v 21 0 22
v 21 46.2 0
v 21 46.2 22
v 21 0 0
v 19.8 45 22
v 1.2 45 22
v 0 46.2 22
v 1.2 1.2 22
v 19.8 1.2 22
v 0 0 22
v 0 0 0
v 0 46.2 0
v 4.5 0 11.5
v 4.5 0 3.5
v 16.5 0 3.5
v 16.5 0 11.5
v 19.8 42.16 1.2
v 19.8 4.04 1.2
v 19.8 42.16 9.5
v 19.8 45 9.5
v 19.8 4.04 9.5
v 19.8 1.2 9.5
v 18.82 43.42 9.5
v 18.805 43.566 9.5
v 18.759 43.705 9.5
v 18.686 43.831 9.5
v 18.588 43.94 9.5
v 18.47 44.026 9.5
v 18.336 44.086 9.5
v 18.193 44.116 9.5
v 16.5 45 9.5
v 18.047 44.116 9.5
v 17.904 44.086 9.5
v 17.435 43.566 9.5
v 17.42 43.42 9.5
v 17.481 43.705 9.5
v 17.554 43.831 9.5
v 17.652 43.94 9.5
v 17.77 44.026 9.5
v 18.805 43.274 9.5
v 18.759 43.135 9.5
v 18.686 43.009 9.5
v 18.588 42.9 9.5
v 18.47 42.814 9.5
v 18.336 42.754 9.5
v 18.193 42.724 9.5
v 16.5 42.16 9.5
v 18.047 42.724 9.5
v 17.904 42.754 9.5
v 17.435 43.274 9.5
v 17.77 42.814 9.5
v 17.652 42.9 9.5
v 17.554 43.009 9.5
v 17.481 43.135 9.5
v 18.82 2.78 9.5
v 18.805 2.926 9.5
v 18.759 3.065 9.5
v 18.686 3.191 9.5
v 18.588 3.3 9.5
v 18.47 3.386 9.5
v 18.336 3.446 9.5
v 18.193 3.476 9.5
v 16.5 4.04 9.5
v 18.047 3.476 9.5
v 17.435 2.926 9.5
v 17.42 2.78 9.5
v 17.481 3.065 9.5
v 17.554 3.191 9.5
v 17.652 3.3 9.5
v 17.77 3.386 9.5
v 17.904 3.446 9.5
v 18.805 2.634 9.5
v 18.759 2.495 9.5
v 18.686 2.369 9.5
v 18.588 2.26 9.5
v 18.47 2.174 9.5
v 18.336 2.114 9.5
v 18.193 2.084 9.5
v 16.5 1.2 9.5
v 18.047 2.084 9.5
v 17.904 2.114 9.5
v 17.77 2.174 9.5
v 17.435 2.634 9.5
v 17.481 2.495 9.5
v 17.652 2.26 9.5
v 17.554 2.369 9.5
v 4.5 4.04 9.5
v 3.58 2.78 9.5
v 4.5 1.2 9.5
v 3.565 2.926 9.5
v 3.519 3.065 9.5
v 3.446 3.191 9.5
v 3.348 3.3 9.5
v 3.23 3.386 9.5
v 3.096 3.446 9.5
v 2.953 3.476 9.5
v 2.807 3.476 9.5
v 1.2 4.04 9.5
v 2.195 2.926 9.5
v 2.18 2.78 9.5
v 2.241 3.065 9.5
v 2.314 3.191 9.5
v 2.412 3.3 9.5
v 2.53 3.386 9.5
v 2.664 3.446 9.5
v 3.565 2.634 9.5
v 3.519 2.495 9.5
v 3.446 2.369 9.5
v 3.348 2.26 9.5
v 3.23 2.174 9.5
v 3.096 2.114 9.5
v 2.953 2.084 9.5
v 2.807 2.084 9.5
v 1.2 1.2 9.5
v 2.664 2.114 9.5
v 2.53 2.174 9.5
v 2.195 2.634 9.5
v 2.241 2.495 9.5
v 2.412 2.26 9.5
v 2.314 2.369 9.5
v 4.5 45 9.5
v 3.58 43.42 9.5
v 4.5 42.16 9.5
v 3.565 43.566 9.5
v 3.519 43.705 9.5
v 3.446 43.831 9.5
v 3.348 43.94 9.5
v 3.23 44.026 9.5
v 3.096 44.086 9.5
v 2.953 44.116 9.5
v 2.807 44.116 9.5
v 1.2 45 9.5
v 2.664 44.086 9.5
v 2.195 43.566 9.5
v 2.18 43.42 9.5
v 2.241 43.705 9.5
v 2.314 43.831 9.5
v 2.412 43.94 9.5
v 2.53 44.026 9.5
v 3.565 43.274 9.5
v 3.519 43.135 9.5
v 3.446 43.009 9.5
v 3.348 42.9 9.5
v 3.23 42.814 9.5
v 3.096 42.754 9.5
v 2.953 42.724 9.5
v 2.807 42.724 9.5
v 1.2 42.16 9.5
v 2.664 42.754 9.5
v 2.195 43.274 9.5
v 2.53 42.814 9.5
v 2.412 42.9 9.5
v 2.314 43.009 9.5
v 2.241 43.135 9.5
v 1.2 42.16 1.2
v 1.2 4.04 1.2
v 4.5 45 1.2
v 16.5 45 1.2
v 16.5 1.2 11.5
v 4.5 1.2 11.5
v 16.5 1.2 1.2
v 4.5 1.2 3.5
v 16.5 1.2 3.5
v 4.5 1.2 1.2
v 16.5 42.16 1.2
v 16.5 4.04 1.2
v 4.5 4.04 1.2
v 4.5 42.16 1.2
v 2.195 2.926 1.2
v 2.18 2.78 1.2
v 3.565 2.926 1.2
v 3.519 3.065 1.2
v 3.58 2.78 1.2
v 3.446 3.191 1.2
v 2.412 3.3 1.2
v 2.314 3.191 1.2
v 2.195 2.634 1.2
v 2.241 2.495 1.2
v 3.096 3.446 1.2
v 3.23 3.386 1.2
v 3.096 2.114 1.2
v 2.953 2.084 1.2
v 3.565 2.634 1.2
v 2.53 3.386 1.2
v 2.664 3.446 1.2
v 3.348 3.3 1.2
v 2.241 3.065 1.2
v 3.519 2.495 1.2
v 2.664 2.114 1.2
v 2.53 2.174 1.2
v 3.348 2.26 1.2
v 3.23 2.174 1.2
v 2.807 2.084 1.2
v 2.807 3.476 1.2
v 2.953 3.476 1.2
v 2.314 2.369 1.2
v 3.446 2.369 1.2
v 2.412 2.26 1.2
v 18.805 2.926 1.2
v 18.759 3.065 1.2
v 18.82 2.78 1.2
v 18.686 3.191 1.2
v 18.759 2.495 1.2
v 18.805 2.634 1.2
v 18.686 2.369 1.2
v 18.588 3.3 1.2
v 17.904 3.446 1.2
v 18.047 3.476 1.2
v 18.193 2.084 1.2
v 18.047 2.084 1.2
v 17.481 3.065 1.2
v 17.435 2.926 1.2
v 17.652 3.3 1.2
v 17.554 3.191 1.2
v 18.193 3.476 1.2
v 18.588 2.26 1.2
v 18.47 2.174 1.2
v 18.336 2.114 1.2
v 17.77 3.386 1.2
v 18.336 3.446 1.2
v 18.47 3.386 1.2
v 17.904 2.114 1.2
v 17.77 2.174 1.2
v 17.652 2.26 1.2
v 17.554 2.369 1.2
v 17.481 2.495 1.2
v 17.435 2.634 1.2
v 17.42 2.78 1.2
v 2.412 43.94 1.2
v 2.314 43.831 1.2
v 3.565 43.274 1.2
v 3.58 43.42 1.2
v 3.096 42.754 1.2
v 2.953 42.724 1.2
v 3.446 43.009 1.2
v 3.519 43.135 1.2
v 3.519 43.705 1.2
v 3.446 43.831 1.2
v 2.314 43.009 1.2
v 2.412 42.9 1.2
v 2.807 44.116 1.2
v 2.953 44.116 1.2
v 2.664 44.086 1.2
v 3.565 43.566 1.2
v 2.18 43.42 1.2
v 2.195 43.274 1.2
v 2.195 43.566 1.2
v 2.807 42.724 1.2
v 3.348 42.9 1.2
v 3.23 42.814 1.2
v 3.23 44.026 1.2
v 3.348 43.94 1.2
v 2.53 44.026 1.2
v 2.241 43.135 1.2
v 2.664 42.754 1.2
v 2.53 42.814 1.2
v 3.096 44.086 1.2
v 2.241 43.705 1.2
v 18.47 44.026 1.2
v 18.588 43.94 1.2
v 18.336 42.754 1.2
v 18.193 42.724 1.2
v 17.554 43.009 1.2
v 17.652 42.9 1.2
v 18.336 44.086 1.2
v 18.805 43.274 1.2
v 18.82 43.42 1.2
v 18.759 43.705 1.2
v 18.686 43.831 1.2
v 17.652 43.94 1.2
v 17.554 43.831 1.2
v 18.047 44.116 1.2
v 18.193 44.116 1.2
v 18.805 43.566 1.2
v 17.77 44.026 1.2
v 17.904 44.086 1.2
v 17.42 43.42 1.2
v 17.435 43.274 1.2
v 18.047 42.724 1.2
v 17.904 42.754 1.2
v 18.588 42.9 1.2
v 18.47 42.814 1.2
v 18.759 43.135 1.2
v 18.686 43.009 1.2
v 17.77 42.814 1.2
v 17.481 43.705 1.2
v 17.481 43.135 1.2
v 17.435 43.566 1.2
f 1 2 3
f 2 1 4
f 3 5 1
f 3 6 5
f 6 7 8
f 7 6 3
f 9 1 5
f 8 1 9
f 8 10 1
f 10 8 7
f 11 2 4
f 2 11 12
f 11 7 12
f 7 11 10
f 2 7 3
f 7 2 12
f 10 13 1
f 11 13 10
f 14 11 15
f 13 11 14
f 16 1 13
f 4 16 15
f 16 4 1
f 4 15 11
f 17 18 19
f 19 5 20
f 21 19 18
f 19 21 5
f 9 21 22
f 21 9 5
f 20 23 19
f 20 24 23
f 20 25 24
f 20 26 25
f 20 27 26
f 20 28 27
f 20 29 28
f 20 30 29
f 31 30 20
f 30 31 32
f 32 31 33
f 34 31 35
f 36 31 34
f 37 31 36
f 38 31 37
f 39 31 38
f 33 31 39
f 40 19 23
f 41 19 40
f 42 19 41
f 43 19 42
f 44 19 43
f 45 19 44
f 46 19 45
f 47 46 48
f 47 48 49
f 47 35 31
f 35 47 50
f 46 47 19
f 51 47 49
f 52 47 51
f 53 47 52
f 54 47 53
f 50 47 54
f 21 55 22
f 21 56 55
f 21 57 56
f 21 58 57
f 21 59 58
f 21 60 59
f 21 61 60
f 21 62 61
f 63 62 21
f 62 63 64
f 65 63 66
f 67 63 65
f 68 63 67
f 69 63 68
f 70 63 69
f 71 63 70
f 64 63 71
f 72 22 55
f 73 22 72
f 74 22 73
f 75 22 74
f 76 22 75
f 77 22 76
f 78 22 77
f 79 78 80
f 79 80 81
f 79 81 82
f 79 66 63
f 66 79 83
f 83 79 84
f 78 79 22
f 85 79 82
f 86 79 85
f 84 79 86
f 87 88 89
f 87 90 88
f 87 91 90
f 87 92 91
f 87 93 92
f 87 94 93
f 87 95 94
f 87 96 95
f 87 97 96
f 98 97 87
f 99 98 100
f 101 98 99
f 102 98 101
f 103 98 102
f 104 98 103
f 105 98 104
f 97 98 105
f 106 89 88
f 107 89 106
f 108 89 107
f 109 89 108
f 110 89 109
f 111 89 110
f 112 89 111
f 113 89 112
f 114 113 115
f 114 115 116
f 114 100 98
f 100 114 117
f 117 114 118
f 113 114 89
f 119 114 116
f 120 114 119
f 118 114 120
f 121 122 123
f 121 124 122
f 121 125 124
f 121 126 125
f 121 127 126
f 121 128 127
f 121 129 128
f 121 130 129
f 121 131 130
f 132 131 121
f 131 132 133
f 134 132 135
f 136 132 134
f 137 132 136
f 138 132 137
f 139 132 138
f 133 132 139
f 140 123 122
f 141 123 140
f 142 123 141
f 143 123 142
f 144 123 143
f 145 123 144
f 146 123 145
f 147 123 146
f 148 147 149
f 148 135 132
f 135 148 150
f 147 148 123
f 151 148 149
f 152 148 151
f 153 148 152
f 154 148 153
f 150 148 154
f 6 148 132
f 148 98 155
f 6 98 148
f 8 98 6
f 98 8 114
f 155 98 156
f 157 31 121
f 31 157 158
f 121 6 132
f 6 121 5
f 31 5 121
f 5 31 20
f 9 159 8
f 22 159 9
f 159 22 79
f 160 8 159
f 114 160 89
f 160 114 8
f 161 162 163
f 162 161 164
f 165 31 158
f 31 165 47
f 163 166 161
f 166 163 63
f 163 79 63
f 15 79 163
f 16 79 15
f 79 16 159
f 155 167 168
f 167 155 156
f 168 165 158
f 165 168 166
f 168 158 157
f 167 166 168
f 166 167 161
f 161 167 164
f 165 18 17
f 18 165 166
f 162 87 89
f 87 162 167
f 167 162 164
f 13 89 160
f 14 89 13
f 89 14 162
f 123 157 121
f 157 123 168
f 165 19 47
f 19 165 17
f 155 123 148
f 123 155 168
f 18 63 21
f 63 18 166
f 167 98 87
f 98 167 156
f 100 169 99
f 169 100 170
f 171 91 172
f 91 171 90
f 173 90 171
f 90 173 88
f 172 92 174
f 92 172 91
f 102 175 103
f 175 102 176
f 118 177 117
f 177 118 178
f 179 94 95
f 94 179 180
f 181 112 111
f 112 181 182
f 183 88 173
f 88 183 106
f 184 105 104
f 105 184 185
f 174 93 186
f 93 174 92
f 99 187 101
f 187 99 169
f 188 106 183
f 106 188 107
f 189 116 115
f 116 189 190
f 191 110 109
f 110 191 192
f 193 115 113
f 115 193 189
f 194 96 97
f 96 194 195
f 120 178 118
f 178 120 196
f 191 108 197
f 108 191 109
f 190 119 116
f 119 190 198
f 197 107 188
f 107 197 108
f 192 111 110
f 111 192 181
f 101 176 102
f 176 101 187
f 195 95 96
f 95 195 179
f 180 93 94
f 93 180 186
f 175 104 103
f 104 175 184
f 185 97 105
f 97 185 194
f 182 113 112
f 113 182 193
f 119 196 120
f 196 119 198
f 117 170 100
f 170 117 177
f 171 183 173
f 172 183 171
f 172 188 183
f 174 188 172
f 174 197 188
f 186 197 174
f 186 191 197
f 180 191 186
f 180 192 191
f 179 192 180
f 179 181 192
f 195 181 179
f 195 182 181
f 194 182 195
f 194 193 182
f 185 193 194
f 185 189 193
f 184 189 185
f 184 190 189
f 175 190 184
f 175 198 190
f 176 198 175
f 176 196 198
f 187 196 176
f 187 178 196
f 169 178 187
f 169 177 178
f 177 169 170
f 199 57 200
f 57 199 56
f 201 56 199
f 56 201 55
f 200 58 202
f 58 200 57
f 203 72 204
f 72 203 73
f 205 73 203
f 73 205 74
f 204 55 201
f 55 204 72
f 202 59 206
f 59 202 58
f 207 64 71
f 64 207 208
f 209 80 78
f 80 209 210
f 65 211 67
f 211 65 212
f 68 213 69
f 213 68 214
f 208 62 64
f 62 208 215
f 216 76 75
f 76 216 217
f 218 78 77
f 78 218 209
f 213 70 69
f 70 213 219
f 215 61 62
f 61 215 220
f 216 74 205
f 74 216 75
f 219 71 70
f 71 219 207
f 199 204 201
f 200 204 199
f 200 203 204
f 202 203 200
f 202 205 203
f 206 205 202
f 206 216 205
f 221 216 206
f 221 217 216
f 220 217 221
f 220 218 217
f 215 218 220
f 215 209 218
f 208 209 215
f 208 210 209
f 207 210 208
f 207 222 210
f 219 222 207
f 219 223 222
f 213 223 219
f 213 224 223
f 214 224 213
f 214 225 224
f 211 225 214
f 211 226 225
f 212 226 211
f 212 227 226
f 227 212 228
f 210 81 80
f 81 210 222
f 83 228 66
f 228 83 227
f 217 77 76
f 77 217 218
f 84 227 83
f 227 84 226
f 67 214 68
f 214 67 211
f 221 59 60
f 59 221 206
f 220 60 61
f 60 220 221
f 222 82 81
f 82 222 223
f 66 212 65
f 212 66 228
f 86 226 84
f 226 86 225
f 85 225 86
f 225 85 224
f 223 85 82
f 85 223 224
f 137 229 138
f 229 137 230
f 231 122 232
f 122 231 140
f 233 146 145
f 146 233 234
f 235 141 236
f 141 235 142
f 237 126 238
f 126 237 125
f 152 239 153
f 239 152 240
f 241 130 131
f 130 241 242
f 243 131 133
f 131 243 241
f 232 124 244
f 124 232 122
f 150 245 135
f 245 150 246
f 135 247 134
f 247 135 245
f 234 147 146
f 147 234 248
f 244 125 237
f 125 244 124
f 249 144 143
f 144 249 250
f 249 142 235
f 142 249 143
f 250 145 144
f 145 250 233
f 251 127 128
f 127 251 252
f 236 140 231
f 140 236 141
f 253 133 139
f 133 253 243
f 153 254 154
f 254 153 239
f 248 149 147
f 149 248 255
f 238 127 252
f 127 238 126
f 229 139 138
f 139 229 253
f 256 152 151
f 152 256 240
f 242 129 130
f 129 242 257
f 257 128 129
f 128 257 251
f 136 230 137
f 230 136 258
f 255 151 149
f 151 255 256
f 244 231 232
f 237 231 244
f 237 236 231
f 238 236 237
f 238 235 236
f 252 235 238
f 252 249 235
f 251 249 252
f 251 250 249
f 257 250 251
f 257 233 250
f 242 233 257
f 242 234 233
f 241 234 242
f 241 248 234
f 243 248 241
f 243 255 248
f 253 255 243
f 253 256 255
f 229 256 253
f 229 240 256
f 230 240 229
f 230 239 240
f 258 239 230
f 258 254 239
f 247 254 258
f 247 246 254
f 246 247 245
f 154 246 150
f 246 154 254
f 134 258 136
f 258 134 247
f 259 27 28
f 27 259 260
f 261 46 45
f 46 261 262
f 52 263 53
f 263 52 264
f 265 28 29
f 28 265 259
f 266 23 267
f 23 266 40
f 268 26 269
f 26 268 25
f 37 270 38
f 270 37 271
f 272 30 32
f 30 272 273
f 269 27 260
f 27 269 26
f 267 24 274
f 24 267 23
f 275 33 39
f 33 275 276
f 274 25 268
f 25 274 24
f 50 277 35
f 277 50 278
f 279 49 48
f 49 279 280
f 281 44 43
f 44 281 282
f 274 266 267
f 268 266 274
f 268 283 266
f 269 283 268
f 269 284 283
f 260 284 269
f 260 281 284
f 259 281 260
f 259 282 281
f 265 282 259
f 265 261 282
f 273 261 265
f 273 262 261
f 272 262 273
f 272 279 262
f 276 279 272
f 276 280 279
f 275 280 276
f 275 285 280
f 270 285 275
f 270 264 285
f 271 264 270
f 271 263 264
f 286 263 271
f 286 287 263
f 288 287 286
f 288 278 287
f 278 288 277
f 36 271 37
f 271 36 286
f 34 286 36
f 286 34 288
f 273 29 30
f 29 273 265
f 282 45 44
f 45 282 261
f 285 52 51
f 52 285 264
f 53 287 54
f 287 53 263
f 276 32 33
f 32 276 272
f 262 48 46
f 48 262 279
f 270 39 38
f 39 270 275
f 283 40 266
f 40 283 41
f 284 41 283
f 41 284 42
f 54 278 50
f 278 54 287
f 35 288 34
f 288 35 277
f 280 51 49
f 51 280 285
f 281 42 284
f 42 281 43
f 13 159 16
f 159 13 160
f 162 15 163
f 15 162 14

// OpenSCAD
/* Housing for the Arduino Nano Interface 
 *  See readme.md for further details
 *
 * Print with PLA, perhaps support for USB socket hole. Use 40 % infill (screw domes).
 *
 * Copyright, 2023, Mathias Moog, Deutschland, CC-BY-NC-SA
 */
 
$fn=30;
 
// Wall Thickness
w = 1.2;
// Space arround Nano
s = 0.3;
// ISP heigt
h_isp = 8;
// Top of Nano PCB to top of matrix board
h_nm  = 12.5;

// Diameter for the screw holes, arduino 1.8 mm
d = 1.4;
// You need 4 screws with 1.6 mm diameter and 20 mm length

// USB Heigt
u_h = 4;
// USB Width
u_w = 8;
// Space arround USB
u_s = 2;

// Arduino nano dimenisons from Datasheet

// length
n_l  = 43.2;
// hole distance in length direction
n_hl = 40.64;

// width
n_w  = 18;
n_hw = 15.24;

difference() {
  // complet material
  cube([n_w+2*(s+w),n_l+2*(s+w),h_isp+h_nm+s+w]);
  // Below Arduino
  translate([w,w,h_isp+s+w]) cube([n_w+2*s,n_l+2*s,h_nm+s]);
  // Arduion, without area for mounting hole
  // widht, a bit more for mountings
  wm=3;
  translate([w+wm+s,w,w])
    cube([n_w-2*wm,n_l+2*s,h_isp+2*s]);
  // length a bit less
  wl=2.54;
  translate([w,w+wl+s,w])
    cube([n_w+2*s,n_l-2*wl,h_isp+2*s]);
  // Screw holes
  h_w = w+s+(n_w-n_hw)/2;
  h_l = w+s+(n_l-n_hl)/2;
  translate([h_w,h_l,w])
    cylinder(d=d,h=h_isp+2*s);
  translate([h_w+n_hw,h_l,w])
    cylinder(d=d,h=h_isp+2*s);
  translate([h_w,h_l+n_hl,w])
    cylinder(d=d,h=h_isp+2*s);
  translate([h_w+n_hw,h_l+n_hl,w])
    cylinder(d=d,h=h_isp+2*s);
  // USB Hole
  u_W = w+s+(n_w-u_w)/2-u_s;
  u_H = w+s+h_isp-u_h-u_s;
  translate([u_W,-w,u_H])
    cube([u_w+2*u_s,3*w,u_h+2*u_s]); 
}  
